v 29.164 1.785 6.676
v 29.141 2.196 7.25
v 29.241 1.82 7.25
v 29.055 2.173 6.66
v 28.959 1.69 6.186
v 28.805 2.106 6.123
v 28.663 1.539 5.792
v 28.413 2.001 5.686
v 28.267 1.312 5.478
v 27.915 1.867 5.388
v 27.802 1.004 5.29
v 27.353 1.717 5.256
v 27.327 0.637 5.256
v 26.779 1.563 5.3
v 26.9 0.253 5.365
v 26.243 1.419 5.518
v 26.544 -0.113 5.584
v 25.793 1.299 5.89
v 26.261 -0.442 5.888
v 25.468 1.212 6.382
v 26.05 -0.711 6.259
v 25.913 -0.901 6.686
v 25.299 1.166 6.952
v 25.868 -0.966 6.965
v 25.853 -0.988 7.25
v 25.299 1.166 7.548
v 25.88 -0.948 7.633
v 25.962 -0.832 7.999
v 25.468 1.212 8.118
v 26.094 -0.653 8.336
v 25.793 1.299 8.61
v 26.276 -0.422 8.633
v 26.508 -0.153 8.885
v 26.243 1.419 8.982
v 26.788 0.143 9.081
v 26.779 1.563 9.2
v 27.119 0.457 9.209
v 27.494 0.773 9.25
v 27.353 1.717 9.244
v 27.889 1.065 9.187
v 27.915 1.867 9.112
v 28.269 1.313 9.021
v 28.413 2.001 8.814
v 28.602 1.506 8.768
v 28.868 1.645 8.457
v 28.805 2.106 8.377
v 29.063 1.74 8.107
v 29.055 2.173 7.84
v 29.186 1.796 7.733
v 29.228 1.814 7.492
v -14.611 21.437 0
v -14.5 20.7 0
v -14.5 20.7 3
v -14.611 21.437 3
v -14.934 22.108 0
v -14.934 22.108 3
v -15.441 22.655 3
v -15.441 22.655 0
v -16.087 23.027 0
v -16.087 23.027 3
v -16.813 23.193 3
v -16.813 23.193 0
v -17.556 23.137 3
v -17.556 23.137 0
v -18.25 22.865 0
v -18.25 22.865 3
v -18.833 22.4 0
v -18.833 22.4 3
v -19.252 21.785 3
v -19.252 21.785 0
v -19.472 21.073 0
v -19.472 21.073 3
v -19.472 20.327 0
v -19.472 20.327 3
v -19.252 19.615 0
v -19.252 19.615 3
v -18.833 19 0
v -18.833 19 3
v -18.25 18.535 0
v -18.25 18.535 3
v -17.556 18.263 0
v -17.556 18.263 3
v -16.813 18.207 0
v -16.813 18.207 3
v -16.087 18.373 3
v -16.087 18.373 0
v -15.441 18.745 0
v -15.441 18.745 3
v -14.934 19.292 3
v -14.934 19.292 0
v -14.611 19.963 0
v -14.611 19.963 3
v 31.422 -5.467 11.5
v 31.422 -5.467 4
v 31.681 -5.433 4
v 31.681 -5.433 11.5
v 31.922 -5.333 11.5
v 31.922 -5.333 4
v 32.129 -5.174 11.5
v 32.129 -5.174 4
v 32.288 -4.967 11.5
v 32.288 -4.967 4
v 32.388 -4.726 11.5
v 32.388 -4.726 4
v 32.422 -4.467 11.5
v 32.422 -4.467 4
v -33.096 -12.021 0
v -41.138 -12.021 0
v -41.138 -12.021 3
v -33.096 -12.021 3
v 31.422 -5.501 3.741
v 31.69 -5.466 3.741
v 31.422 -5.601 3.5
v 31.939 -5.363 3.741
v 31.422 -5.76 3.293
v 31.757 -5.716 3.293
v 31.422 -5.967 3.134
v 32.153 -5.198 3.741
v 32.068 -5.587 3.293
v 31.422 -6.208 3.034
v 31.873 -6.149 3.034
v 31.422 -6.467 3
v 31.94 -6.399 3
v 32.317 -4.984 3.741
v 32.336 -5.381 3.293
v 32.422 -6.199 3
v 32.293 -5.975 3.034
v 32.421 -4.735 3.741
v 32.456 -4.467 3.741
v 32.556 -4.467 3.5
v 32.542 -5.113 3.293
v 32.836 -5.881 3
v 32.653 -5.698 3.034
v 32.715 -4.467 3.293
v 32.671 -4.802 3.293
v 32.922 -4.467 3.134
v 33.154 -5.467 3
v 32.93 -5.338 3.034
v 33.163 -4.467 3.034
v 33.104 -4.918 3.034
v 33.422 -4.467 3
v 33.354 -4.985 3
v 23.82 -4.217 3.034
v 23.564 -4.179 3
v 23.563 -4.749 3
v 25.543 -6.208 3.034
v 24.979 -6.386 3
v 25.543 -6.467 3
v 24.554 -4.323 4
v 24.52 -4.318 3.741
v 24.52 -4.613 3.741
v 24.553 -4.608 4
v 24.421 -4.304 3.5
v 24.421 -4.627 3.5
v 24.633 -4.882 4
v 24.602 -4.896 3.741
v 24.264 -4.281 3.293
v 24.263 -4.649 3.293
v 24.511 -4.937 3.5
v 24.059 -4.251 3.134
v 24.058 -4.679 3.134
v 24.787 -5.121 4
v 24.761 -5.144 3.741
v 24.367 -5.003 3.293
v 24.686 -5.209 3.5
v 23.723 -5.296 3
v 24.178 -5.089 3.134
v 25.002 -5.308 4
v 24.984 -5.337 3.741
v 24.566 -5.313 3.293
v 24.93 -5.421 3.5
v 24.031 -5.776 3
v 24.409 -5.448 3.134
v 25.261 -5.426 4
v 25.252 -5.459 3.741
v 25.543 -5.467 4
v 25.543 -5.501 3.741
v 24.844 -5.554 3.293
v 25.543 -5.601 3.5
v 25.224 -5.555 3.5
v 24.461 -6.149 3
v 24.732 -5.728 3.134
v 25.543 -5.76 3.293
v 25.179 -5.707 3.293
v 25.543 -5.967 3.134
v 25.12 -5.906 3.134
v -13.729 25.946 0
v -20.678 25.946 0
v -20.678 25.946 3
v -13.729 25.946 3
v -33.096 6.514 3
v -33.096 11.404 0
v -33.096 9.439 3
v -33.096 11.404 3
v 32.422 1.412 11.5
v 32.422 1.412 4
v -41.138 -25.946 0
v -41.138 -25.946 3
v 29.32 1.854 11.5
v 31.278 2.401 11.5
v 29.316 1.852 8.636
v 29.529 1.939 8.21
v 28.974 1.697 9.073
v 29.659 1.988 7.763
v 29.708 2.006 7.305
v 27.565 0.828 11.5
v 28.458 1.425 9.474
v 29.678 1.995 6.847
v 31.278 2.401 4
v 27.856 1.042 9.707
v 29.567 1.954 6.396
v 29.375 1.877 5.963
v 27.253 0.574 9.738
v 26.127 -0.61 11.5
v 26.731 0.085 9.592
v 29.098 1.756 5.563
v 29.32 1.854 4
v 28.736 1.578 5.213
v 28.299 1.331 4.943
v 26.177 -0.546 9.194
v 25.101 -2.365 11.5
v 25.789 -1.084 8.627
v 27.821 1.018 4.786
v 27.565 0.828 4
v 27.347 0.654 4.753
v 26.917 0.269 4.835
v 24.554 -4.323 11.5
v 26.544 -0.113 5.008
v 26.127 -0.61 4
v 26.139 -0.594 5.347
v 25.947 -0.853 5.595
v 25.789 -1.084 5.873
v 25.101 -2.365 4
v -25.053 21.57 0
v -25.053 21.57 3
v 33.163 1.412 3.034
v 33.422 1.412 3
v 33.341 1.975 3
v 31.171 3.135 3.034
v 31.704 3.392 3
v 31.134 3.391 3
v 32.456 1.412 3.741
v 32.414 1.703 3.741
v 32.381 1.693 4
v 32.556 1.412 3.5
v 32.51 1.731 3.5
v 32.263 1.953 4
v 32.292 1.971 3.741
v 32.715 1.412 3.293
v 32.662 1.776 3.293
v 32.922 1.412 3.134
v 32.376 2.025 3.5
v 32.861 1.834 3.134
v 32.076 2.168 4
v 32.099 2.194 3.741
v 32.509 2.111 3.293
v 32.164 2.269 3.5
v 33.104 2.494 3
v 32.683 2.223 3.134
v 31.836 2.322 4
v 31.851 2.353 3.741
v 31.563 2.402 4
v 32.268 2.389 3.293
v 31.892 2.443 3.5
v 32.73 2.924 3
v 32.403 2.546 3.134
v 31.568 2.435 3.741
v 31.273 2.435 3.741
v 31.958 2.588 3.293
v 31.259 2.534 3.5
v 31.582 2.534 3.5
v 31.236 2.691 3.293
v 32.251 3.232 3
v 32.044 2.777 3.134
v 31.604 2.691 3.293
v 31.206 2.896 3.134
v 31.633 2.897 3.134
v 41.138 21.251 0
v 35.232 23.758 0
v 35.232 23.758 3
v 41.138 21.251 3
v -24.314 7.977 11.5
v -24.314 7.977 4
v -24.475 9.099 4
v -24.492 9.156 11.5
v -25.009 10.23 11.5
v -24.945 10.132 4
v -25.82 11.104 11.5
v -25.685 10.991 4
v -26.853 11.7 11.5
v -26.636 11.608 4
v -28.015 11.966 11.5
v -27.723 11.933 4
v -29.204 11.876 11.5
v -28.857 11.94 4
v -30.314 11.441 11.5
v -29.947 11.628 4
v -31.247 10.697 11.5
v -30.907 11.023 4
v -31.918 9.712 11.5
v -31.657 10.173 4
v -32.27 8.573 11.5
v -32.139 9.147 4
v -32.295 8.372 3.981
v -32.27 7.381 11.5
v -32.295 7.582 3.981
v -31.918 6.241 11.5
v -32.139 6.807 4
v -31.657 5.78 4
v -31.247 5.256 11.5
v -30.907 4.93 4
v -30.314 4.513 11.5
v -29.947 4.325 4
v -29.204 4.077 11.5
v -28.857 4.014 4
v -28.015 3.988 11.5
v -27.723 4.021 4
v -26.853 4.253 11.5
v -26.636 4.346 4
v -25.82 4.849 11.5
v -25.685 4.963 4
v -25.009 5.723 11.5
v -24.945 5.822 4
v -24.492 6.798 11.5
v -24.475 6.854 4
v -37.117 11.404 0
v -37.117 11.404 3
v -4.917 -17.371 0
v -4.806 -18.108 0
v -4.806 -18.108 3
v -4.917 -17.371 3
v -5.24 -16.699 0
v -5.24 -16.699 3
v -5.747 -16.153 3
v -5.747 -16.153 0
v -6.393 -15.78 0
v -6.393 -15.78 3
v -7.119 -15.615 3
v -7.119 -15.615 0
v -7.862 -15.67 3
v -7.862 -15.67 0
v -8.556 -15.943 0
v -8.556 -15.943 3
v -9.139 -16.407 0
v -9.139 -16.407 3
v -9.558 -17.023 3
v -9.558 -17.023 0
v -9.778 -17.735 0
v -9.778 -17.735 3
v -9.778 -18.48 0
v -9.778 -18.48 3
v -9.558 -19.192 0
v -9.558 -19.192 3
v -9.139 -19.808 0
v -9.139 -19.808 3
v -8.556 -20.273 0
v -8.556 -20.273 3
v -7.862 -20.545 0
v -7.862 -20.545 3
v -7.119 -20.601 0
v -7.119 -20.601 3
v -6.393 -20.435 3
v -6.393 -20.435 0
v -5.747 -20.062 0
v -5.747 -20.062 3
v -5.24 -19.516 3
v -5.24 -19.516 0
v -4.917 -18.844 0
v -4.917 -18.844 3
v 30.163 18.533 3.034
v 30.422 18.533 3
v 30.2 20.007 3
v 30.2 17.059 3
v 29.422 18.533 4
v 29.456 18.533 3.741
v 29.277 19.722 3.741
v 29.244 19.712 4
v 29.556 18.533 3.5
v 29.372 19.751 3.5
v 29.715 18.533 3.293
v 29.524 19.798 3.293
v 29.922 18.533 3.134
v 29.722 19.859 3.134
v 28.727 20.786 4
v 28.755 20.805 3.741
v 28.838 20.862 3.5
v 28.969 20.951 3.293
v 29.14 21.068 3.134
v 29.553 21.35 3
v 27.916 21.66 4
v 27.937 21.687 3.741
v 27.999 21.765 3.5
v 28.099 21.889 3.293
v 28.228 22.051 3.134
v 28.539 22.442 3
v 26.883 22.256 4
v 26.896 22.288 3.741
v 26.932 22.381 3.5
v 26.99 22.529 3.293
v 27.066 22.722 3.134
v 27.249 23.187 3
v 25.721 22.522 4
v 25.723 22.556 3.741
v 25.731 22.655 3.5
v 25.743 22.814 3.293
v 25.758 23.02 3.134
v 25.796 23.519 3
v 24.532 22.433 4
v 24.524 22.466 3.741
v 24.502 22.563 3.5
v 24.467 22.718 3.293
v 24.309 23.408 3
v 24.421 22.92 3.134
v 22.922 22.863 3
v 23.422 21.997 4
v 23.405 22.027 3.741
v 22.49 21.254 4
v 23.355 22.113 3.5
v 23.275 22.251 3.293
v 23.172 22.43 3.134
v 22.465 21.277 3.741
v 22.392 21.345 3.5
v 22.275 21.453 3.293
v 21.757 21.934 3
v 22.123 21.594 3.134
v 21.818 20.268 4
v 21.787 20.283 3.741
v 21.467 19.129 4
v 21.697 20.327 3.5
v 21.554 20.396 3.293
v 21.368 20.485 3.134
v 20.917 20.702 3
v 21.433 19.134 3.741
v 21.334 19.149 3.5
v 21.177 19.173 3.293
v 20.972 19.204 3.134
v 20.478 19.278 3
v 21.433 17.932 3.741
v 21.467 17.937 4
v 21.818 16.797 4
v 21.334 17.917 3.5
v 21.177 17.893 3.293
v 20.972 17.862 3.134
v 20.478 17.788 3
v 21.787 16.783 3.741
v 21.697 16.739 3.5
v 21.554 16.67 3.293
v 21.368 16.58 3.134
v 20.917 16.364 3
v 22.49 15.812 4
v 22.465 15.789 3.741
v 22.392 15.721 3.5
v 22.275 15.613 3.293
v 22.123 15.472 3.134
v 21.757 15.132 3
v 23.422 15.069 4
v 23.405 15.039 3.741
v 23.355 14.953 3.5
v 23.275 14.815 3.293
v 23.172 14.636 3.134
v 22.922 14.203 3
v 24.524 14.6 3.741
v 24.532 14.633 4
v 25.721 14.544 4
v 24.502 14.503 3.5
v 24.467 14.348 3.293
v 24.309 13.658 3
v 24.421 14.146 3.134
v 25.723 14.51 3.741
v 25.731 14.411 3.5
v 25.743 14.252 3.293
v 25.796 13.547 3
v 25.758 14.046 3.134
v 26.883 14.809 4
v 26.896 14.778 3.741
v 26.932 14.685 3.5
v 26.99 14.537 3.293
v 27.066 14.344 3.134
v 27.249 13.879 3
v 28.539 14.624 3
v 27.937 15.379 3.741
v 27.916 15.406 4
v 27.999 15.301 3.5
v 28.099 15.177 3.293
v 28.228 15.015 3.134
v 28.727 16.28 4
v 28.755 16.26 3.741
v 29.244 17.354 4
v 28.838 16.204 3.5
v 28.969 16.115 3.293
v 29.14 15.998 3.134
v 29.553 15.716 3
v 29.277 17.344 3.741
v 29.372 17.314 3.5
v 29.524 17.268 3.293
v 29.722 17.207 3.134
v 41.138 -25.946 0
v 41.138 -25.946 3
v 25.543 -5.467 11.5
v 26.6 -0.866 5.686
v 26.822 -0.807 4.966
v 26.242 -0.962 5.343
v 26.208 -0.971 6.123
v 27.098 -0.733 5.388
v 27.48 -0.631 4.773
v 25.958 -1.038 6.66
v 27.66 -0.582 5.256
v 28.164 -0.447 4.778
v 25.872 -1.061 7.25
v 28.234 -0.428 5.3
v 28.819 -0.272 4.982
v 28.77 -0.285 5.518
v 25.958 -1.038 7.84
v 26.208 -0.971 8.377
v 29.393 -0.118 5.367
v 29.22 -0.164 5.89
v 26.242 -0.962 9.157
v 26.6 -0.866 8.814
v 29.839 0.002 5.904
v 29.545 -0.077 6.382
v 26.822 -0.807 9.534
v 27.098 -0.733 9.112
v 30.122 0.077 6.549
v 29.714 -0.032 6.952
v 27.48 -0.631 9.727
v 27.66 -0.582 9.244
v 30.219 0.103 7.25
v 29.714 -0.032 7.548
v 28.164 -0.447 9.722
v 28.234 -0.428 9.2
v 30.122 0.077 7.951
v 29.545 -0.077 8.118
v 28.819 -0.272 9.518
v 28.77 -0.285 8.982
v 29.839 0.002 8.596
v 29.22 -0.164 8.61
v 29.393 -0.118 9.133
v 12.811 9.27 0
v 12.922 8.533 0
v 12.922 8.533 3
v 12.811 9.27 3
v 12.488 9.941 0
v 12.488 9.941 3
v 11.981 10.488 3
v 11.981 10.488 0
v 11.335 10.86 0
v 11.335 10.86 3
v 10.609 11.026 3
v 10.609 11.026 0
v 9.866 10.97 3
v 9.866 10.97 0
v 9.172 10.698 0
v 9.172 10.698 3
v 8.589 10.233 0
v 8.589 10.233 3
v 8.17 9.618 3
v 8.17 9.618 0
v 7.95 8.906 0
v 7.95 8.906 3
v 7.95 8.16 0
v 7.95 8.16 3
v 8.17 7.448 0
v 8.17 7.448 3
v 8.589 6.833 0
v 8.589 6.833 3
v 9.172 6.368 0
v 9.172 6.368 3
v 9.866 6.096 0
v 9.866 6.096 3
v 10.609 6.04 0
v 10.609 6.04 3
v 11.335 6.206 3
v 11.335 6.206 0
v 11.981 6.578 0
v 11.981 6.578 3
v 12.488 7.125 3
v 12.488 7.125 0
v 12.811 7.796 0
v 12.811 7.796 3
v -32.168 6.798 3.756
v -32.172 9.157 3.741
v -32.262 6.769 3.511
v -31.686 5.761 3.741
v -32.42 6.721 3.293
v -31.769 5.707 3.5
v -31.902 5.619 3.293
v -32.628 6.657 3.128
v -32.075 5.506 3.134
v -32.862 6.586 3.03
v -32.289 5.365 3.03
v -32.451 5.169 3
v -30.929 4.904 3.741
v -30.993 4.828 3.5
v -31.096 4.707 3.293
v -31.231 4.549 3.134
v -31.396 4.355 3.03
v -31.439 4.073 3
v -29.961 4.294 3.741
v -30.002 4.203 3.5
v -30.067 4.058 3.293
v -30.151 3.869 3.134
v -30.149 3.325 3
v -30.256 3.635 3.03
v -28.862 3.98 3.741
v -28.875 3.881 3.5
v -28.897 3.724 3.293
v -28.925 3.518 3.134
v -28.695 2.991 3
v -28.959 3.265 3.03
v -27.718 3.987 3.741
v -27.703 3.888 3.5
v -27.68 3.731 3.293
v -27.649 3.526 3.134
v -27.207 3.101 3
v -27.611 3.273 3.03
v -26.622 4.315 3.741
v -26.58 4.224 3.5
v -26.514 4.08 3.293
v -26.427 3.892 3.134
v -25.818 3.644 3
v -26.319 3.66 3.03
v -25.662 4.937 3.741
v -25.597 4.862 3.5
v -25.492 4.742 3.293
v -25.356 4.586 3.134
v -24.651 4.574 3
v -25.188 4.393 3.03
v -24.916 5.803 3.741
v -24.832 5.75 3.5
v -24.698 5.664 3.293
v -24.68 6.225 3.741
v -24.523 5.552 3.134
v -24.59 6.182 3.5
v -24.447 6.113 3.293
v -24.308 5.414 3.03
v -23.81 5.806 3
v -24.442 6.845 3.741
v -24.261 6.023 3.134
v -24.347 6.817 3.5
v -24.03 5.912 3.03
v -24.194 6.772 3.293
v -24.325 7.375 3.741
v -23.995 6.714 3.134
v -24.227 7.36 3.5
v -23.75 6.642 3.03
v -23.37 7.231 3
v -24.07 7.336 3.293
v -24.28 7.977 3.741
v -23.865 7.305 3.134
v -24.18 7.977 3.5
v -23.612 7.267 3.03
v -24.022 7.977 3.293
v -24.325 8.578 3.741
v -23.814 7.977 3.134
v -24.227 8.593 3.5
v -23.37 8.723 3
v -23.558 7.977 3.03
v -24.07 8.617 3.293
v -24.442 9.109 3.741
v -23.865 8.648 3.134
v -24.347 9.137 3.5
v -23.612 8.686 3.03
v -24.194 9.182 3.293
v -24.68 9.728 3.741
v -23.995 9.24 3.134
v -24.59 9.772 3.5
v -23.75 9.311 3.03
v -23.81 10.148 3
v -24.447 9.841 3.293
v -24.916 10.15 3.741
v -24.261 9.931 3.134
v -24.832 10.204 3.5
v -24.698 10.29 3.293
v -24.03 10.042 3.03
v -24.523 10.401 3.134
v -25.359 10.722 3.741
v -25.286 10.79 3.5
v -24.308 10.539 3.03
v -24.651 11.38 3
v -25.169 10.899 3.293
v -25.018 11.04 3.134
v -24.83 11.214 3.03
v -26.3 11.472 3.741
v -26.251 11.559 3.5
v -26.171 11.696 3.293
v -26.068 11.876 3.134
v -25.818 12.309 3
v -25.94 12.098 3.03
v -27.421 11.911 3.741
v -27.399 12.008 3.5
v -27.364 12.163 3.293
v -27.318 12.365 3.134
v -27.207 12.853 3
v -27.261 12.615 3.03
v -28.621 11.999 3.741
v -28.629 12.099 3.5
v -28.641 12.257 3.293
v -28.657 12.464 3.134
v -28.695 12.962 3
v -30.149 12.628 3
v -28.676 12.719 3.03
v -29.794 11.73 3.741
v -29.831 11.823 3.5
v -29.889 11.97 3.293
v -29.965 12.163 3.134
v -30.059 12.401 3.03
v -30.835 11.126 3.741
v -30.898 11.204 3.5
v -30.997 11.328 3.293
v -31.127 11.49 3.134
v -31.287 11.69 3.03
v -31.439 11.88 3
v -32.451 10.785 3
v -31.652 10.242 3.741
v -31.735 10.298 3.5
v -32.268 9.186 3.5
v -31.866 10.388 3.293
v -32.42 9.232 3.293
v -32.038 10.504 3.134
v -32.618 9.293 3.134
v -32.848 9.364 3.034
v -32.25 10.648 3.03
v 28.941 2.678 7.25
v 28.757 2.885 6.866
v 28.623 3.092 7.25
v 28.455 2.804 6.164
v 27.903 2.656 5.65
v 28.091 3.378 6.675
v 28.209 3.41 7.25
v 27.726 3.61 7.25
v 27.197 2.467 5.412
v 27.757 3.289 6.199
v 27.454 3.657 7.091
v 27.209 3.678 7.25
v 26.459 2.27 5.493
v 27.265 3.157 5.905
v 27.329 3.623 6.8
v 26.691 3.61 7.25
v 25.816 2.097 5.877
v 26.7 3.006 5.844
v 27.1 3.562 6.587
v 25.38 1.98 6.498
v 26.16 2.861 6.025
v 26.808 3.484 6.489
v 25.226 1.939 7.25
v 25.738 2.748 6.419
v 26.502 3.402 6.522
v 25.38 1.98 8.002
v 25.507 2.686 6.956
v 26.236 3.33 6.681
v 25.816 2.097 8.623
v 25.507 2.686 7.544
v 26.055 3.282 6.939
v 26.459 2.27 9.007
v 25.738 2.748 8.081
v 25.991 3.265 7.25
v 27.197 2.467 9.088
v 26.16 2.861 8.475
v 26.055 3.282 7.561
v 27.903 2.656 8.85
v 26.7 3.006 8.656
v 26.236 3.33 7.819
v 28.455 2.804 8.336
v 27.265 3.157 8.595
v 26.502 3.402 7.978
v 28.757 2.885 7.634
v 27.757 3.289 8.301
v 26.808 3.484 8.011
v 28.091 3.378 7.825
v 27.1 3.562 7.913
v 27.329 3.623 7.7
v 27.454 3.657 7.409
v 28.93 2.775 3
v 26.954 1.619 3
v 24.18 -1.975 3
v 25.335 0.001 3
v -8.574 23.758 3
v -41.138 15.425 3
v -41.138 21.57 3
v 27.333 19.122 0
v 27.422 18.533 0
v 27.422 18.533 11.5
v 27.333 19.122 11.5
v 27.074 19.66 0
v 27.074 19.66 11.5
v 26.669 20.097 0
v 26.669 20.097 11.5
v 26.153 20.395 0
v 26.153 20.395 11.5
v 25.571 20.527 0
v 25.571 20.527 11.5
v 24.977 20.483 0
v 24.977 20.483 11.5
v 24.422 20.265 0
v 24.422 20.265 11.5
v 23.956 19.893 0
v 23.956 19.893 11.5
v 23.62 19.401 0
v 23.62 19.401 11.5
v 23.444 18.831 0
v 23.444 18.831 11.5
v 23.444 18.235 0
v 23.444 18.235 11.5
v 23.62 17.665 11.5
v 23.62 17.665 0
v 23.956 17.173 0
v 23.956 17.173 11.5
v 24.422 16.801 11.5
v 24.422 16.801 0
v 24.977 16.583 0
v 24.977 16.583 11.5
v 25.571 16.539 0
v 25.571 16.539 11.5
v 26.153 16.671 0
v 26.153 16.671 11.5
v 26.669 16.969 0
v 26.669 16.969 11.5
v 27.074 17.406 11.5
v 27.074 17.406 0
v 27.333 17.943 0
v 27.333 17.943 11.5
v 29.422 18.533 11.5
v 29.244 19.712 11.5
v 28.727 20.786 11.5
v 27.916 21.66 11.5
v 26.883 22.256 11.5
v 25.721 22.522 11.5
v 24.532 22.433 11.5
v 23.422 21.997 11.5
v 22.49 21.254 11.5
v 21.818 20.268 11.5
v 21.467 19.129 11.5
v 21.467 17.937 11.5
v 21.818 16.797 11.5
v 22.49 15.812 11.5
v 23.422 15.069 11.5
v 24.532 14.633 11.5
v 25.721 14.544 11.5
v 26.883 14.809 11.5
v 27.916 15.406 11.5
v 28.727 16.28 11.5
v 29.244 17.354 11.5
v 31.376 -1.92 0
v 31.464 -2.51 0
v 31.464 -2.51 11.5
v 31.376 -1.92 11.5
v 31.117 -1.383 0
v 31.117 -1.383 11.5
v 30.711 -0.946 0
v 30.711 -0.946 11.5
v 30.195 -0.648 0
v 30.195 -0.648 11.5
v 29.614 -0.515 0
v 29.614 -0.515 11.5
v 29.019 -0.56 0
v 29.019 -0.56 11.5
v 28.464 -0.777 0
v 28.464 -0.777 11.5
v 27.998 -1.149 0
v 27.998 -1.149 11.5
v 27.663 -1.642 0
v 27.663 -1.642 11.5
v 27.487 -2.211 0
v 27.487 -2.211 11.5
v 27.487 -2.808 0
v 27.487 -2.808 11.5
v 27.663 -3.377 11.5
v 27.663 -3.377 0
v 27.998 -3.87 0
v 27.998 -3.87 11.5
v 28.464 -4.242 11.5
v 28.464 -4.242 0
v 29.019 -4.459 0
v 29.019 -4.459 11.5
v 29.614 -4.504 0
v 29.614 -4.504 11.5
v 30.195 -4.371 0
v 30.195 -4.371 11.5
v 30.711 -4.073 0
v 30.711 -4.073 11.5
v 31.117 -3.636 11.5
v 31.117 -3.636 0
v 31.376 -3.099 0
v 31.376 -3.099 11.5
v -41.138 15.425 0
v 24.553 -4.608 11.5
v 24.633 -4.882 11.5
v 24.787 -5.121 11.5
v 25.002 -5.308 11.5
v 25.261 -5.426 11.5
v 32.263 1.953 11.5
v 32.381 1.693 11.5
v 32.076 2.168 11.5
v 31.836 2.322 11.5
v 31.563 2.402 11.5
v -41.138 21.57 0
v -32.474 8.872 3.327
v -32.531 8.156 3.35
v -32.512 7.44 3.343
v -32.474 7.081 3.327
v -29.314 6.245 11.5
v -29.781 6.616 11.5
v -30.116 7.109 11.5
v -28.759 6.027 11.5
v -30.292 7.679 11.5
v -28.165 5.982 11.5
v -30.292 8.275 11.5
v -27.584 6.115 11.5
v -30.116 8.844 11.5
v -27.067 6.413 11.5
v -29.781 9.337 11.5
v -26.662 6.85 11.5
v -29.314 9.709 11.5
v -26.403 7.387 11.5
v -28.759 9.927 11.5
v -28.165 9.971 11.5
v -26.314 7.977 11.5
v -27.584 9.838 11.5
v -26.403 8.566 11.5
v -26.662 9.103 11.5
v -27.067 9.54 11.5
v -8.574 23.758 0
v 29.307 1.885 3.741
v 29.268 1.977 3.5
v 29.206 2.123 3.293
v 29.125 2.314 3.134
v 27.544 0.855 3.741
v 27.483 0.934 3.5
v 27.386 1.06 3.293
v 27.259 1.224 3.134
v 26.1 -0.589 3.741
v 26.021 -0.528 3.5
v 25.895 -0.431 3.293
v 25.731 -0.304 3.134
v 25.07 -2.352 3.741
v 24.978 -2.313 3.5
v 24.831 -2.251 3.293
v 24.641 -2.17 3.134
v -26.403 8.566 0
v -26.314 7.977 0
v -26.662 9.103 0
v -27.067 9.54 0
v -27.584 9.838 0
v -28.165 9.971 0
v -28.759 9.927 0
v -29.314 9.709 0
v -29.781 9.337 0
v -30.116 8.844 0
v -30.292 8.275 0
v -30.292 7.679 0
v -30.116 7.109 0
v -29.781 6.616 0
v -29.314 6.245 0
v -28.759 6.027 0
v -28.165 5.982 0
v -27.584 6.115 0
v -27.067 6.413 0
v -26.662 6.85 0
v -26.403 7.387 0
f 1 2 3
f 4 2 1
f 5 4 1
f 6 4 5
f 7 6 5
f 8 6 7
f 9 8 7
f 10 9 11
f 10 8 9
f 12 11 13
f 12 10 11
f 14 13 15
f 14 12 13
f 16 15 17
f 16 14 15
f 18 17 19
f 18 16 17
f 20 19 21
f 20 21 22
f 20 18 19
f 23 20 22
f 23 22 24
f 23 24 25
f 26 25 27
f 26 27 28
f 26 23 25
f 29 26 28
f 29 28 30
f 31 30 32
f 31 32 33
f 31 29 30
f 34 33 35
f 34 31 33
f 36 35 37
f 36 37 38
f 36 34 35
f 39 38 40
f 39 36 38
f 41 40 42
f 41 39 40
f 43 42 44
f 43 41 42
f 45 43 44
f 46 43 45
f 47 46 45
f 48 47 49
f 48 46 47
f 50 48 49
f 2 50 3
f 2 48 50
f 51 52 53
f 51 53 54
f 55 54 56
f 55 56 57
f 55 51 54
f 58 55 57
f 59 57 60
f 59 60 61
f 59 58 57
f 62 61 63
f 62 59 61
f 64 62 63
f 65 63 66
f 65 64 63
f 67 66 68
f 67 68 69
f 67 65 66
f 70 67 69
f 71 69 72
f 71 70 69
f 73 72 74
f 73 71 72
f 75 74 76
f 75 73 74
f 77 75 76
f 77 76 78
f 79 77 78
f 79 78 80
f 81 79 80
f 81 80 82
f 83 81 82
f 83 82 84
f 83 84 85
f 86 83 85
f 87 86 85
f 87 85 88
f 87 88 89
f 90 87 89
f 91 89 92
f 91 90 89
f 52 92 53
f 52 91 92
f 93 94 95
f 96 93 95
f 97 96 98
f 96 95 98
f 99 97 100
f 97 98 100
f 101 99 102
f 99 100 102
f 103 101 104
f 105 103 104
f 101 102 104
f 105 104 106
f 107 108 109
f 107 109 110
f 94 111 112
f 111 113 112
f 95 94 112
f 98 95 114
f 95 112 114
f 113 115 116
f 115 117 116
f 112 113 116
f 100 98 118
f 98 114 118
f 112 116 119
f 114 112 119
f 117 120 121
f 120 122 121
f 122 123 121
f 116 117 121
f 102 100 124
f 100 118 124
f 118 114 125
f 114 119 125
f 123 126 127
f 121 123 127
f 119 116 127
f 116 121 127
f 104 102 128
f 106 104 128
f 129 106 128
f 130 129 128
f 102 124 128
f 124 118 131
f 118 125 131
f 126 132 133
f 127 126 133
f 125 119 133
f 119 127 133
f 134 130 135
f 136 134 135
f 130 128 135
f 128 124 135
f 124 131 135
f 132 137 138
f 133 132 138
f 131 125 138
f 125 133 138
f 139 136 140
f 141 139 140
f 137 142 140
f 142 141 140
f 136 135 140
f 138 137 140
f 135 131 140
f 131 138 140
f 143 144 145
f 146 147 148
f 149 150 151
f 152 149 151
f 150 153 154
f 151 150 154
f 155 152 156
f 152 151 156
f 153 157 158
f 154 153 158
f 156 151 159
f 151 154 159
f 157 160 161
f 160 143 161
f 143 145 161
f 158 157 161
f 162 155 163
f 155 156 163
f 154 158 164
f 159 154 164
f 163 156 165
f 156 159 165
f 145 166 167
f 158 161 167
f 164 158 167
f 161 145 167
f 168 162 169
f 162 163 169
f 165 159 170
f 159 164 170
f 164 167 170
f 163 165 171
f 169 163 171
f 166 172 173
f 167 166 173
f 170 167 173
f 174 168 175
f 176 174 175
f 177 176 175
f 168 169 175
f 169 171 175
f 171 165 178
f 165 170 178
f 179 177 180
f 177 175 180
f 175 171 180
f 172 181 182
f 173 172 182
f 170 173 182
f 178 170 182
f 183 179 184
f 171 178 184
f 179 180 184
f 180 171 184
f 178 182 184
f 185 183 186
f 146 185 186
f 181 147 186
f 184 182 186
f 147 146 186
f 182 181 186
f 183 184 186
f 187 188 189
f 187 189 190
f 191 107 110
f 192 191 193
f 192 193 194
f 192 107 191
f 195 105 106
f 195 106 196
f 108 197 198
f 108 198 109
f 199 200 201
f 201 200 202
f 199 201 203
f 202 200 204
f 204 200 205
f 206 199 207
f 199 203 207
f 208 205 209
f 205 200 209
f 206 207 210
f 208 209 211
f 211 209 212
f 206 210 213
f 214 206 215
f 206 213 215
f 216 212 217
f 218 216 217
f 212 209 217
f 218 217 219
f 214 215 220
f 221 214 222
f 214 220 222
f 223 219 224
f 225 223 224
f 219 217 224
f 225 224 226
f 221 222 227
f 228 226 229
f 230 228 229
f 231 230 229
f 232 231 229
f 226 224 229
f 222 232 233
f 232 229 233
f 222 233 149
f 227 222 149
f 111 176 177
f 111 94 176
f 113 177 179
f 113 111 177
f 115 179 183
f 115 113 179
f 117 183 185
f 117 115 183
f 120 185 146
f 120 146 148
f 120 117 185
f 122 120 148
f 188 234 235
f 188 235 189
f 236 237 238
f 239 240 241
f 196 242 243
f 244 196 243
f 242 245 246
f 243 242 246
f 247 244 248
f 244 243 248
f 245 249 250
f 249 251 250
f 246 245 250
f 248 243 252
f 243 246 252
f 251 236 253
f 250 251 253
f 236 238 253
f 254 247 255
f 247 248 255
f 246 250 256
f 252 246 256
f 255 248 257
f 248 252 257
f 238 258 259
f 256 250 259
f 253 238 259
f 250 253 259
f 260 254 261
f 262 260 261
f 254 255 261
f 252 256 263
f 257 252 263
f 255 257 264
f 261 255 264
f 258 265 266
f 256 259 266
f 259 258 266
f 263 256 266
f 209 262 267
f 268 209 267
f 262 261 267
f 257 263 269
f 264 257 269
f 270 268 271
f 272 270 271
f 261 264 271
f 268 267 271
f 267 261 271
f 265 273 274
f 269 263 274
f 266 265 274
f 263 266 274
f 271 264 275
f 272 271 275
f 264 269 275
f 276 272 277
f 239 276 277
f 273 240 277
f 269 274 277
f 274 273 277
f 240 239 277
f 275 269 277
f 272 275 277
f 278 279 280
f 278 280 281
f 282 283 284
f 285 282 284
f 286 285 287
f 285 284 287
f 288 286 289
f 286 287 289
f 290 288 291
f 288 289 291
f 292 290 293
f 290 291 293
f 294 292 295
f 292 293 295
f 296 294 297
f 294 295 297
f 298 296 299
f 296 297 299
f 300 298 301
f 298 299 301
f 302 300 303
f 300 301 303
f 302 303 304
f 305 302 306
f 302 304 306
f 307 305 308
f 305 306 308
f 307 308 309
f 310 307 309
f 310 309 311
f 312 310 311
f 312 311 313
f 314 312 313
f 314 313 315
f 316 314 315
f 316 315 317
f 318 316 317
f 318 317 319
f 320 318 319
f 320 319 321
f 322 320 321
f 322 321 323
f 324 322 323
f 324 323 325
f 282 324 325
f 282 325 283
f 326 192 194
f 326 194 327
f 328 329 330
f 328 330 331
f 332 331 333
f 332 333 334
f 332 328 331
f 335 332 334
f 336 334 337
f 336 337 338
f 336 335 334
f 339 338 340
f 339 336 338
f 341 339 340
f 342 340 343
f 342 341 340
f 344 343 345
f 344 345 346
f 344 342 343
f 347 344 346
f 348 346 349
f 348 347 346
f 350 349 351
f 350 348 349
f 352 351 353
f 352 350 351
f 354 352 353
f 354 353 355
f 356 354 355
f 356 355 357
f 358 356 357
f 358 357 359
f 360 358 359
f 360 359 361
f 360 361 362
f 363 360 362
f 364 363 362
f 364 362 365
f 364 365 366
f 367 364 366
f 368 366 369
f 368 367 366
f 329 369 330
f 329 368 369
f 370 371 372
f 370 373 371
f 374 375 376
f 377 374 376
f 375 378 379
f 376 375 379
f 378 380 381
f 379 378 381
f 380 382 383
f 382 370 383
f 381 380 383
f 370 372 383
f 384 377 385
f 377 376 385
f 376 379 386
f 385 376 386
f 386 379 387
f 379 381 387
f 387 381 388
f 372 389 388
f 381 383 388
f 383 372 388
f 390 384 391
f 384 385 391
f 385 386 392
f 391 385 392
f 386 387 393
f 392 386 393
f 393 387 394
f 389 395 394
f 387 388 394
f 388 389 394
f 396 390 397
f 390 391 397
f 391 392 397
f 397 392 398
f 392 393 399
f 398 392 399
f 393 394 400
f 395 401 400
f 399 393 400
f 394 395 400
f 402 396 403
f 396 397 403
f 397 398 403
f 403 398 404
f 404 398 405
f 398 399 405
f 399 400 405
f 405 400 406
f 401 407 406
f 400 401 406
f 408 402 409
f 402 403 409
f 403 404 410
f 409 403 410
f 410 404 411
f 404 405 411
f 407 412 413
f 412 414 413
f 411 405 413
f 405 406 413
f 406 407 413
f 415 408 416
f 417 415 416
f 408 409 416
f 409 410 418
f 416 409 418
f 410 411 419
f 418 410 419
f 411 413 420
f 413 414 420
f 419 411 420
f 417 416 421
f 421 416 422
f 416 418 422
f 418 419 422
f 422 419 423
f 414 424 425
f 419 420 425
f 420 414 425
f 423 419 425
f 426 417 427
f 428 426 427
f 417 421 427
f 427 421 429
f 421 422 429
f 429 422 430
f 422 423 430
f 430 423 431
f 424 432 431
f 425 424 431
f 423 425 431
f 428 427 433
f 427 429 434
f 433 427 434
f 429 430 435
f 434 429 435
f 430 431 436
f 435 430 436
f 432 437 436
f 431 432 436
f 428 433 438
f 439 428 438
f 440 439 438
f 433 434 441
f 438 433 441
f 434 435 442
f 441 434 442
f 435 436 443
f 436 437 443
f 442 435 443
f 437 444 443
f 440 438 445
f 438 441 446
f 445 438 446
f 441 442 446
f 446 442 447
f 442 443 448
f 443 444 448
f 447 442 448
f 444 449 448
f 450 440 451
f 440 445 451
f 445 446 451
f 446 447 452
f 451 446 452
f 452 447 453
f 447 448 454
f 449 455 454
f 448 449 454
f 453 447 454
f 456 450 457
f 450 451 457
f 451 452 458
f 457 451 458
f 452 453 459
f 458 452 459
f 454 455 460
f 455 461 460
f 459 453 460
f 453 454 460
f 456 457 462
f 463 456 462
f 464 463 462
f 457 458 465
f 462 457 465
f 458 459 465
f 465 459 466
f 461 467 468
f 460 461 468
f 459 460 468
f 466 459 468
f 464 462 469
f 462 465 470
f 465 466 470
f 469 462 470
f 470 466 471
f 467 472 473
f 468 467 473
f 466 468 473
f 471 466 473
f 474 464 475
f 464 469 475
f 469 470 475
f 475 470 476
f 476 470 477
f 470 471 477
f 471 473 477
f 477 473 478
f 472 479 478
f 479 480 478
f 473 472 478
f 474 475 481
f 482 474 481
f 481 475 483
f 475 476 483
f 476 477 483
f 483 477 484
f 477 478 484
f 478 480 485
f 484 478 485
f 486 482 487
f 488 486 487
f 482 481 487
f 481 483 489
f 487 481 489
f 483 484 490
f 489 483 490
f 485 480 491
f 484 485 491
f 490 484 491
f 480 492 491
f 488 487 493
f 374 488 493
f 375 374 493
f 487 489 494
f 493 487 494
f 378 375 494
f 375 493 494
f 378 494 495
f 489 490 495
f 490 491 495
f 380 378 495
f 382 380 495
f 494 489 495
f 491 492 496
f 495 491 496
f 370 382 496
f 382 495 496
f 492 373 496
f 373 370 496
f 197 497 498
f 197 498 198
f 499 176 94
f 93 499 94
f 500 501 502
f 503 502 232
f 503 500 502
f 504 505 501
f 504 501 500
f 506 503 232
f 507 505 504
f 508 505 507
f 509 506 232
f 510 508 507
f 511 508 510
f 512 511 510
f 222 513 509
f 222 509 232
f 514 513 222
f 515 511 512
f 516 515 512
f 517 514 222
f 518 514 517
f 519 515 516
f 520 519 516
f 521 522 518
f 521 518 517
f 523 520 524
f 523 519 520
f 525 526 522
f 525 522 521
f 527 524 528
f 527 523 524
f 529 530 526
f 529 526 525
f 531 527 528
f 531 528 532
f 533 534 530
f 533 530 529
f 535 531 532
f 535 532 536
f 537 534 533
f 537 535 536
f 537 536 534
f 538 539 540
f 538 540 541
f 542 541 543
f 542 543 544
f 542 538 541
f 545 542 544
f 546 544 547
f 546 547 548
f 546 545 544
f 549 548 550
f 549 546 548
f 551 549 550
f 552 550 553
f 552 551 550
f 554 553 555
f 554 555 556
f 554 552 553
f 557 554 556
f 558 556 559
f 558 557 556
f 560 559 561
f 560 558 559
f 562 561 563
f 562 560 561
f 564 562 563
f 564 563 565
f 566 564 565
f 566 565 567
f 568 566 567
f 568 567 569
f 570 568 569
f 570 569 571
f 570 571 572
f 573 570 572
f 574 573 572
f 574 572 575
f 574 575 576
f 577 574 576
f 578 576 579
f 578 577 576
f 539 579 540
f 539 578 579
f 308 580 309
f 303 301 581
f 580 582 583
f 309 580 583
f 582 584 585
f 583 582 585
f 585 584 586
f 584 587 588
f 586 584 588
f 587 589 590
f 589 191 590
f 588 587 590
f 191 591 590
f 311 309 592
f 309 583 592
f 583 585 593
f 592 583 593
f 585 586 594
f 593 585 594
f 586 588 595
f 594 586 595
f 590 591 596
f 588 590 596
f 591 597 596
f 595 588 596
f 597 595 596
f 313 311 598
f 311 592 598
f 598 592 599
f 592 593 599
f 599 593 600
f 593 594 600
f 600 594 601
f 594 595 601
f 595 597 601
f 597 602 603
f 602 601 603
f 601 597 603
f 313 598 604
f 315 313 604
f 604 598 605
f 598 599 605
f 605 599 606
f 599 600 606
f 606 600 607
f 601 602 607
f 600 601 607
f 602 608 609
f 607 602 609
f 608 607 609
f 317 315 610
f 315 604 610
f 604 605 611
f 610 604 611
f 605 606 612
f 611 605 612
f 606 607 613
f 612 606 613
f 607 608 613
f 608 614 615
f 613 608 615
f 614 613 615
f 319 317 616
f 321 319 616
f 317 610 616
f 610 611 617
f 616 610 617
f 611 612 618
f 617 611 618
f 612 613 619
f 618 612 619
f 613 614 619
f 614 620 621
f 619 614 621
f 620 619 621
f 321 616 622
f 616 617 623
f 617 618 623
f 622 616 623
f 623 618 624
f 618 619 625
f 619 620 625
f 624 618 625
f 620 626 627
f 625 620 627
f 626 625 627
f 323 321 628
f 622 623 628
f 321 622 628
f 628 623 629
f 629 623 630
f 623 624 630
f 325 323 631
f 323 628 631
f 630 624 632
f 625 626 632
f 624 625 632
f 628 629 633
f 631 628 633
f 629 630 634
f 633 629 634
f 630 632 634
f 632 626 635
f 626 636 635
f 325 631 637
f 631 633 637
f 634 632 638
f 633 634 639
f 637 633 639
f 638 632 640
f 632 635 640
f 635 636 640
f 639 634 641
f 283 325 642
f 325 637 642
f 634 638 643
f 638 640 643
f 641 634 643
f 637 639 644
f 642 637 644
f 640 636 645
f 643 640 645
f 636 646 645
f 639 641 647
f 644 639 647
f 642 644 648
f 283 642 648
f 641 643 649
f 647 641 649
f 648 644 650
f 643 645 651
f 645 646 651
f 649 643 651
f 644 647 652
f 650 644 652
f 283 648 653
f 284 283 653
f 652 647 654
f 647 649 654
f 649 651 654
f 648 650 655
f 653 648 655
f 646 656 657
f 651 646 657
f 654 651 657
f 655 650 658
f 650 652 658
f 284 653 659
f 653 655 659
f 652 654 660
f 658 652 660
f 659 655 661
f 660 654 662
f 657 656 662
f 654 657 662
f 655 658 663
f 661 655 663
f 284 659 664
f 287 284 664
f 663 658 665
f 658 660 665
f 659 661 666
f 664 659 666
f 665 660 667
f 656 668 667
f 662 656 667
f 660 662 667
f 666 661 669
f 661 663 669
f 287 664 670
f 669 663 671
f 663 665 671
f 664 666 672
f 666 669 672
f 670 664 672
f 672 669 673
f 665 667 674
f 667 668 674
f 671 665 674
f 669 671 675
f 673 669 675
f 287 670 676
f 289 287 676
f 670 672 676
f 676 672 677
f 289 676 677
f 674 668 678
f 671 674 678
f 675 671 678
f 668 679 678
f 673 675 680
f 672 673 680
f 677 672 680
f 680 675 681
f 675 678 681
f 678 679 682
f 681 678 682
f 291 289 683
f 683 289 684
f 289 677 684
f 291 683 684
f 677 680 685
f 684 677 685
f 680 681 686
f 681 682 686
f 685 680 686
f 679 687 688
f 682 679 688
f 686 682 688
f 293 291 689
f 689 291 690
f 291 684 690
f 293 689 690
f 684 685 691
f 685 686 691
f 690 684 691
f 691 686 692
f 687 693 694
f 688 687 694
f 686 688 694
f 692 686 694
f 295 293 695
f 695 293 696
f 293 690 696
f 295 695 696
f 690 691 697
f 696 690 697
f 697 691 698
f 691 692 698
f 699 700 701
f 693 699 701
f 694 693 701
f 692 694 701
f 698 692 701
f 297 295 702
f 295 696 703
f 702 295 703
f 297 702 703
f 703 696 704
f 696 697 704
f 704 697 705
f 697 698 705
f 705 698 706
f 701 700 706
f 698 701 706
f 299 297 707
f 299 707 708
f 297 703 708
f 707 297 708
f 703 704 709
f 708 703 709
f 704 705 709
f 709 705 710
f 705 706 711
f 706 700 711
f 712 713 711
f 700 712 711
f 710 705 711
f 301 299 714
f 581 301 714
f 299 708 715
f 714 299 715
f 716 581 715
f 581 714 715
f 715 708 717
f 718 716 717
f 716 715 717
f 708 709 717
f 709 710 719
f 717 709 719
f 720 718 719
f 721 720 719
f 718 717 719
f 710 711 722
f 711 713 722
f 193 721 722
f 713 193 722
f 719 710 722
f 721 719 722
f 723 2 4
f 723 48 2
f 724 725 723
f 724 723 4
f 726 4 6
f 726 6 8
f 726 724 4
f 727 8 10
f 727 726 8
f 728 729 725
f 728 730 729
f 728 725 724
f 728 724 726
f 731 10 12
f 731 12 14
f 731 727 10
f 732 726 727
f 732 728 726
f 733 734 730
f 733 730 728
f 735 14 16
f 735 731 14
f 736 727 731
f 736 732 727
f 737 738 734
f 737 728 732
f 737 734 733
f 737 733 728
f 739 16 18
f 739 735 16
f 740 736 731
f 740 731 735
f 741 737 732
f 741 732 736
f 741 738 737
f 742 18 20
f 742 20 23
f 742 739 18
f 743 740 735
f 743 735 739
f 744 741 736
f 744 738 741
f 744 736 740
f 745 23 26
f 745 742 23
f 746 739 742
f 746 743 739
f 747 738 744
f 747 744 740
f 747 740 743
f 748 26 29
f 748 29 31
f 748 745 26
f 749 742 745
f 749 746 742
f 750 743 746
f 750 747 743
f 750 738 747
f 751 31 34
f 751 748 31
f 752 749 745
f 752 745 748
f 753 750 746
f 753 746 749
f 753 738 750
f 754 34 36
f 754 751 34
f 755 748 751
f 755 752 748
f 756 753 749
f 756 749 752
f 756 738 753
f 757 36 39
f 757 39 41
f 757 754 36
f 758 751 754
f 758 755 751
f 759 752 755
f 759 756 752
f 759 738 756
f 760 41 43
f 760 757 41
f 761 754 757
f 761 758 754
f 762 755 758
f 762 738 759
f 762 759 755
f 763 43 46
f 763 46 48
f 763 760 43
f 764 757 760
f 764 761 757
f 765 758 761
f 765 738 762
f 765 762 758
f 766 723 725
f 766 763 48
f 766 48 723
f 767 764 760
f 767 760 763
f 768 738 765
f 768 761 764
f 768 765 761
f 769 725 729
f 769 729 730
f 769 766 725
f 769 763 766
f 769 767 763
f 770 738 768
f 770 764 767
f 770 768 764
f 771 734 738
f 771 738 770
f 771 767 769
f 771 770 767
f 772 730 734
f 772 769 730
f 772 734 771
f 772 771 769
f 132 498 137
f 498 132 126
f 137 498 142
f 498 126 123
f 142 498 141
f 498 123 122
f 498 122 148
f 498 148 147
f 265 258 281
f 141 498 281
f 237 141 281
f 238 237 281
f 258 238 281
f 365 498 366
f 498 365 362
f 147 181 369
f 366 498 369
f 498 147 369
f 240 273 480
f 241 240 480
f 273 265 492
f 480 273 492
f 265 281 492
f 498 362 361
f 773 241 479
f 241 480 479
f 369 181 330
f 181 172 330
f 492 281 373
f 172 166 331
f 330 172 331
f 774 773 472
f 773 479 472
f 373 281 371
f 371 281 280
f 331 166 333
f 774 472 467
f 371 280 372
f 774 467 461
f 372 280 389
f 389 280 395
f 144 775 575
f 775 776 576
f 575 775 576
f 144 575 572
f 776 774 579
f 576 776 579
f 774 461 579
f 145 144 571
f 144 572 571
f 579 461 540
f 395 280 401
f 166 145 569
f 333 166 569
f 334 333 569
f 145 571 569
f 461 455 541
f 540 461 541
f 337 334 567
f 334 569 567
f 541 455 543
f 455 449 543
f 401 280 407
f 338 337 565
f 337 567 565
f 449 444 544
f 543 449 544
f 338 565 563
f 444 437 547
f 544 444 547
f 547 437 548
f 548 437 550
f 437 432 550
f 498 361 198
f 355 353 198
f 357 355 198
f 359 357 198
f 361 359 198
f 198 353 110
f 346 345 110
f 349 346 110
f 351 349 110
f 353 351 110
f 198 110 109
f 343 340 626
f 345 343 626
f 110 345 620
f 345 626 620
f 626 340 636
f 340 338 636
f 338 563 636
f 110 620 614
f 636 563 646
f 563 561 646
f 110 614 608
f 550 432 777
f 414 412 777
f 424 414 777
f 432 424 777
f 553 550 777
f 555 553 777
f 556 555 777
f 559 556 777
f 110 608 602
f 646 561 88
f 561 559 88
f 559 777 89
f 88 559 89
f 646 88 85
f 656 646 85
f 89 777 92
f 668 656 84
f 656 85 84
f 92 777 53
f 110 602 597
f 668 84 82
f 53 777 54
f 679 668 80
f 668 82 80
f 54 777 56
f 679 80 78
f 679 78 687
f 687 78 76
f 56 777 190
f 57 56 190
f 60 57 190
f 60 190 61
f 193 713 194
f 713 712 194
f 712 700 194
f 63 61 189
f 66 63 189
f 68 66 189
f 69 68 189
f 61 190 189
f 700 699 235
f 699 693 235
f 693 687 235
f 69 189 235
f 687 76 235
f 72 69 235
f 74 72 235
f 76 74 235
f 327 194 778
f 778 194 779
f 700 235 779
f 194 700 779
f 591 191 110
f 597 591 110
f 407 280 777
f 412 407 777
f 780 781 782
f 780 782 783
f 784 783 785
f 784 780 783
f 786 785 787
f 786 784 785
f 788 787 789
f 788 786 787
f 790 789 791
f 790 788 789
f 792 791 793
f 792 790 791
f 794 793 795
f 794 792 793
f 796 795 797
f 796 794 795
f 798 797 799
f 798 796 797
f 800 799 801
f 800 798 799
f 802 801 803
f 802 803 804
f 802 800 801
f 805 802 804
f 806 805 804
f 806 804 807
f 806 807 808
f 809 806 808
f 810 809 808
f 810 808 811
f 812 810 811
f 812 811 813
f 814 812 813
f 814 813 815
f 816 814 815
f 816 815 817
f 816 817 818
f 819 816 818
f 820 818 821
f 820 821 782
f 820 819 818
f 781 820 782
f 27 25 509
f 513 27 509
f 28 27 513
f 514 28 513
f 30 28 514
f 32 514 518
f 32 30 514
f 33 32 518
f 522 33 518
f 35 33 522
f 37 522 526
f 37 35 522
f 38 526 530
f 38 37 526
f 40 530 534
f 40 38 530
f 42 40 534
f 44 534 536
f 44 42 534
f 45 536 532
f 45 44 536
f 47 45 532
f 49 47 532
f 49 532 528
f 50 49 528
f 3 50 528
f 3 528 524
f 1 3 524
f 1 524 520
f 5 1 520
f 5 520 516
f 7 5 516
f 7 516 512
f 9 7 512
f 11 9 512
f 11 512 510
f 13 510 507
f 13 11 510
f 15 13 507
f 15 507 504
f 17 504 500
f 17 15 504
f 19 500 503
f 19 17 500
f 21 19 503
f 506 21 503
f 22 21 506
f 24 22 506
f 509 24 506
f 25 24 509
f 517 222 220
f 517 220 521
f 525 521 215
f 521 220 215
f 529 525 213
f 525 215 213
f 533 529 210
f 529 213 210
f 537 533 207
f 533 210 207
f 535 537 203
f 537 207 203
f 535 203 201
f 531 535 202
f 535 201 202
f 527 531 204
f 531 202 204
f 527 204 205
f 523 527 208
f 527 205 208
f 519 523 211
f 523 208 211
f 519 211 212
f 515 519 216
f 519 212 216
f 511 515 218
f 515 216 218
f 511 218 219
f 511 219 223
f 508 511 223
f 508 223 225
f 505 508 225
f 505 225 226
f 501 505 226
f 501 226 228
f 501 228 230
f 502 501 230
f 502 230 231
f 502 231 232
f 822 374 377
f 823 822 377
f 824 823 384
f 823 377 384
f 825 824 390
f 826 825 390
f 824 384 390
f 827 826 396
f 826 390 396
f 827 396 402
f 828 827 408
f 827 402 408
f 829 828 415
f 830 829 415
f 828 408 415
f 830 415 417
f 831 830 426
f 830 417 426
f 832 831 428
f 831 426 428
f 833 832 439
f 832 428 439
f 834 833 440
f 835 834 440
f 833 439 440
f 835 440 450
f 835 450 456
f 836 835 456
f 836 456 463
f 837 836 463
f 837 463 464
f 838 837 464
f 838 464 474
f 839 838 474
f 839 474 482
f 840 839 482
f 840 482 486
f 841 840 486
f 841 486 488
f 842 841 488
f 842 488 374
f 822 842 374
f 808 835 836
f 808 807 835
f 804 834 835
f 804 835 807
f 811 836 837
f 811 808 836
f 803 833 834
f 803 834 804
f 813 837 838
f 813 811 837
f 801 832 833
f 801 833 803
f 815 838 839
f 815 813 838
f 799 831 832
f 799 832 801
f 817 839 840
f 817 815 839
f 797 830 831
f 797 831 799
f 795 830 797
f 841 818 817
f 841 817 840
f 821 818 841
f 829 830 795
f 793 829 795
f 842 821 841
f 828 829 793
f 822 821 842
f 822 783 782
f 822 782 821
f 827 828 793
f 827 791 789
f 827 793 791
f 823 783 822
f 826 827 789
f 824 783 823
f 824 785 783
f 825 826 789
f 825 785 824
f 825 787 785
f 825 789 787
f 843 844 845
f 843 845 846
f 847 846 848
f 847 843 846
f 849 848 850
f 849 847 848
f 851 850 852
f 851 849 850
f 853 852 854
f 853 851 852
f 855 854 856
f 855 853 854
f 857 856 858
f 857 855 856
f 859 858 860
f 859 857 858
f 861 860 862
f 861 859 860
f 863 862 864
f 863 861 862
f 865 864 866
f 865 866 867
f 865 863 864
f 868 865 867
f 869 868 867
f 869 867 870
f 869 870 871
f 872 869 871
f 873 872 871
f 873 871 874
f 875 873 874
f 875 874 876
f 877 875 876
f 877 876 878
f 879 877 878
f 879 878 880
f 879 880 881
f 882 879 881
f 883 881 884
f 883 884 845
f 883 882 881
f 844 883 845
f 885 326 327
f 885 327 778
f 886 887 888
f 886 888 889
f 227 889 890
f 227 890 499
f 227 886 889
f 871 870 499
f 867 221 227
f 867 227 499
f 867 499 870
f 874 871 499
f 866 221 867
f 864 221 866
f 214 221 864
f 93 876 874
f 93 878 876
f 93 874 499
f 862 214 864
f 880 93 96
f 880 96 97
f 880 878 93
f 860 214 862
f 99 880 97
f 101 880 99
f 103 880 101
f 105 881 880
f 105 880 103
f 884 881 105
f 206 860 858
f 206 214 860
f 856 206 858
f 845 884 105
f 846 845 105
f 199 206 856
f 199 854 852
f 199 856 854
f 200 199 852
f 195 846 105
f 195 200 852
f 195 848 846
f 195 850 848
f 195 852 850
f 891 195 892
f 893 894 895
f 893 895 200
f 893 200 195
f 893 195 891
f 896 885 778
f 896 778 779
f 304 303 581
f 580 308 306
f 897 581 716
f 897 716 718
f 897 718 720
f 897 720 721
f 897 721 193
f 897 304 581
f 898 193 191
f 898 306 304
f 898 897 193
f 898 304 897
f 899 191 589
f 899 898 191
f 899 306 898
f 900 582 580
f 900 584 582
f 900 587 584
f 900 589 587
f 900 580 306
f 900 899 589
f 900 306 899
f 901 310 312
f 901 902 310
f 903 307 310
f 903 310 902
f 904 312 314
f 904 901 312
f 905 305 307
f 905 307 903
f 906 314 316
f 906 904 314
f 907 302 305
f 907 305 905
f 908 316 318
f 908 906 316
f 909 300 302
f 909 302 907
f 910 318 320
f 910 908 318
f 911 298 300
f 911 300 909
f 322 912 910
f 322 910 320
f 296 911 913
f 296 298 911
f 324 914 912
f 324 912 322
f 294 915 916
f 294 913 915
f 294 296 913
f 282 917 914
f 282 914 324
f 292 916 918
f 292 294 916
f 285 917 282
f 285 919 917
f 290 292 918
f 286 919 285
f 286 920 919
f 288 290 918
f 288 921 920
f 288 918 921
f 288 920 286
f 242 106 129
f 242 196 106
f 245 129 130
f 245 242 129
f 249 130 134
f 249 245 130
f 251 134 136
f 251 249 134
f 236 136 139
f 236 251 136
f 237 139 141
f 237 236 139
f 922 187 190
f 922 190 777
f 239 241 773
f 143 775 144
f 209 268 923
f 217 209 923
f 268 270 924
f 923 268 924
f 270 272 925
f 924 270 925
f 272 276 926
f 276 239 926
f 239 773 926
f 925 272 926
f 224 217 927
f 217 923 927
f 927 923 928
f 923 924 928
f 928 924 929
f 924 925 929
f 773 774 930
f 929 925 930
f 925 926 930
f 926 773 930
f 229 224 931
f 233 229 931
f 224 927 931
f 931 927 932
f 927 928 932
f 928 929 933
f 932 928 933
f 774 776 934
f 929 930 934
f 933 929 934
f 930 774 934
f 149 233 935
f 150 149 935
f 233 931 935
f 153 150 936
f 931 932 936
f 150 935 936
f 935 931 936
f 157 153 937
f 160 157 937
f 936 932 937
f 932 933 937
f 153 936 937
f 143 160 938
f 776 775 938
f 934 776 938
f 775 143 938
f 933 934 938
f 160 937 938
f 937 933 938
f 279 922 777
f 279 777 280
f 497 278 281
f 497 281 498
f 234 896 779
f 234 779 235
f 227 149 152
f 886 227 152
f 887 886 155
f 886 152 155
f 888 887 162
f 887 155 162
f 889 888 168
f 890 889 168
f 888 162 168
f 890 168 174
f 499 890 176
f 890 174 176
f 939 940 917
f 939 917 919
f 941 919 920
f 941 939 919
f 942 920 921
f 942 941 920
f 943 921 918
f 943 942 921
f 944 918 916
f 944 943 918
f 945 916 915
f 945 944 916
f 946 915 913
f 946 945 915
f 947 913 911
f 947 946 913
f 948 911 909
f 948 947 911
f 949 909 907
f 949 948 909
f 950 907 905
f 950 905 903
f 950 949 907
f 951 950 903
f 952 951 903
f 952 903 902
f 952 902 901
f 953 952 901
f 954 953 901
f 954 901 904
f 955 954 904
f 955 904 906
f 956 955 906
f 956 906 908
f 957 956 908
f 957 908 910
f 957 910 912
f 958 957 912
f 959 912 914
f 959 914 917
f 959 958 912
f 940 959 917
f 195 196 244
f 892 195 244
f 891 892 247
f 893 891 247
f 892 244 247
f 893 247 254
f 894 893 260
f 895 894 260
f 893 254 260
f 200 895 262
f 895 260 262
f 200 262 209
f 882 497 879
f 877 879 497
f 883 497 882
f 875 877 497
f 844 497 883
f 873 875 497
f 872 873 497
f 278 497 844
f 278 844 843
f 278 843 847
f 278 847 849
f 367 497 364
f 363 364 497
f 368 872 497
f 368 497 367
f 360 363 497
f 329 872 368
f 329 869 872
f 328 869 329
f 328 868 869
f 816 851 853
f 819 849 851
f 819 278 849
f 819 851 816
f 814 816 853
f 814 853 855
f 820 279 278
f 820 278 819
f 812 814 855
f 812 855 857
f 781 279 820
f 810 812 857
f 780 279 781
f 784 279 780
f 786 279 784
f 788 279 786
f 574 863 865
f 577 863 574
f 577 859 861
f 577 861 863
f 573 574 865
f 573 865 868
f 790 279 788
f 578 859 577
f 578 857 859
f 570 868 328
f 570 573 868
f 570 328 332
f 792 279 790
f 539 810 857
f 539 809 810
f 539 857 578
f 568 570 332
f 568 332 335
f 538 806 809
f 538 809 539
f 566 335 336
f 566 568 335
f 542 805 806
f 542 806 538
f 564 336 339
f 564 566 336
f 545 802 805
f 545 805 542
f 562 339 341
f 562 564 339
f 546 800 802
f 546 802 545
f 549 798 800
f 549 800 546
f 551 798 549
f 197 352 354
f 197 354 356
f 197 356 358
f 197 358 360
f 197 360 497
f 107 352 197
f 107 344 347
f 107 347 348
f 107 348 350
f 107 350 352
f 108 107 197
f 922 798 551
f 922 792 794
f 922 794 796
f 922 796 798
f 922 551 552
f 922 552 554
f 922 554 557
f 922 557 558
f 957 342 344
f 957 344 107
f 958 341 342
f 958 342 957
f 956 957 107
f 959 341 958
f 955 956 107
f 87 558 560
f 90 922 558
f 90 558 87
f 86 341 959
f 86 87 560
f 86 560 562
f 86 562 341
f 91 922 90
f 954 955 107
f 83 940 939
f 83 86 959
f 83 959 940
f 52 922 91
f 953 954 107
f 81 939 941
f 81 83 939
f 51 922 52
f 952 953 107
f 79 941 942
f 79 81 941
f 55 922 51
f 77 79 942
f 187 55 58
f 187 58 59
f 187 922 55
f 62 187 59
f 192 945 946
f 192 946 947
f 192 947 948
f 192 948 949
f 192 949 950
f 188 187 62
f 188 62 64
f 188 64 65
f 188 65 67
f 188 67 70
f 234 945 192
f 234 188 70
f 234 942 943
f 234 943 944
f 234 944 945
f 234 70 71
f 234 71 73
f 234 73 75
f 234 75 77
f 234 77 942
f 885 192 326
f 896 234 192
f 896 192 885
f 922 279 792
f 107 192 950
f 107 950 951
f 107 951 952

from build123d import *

# Parameters (mm, degrees)
SKETCH_2_R          = 2.5
SKETCH_2_R_2        = 4
EXTRUDE_1_DEPTH     = 3
SKETCH_2_3_R        = 2
SKETCH_2_3_R_2      = 4
EXTRUDE_2_DEPTH     = 11.5
SKETCH_6_R          = 2
EXTRUDE_3_DEPTH     = 2.3
FILLET_1_R          = 2
SKETCH_7_R          = 2.5
SKETCH_7_R_2        = 2
CUT_EXTRUDE_2_DEPTH = 2
FILLET_2_R          = 1


with BuildPart() as part:
    # 스케치2 → 보스-돌출1 (new body)
    with BuildSketch(Plane.XY):
        Polygon((-25.053133429, 21.570131373), (-41.138288377, 21.570131373), (-41.138288377, 15.425110404), (-37.11699964, 11.403821667), (-33.095710903, 11.403821667), (-33.095710903, -12.020899542), (-41.138288377, -12.020899542), (-41.138288377, -25.94560961), (41.138288377, -25.94560961), (41.138288377, 21.251065018), (35.231937864, 23.757870491), (-8.574109119, 23.757870491), (-13.728698976, 25.94560961), (-20.677655191, 25.94560961), align=None)
        with Locations((-7.306059133, -18.107570273)):
            Circle(SKETCH_2_R, mode=Mode.SUBTRACT)
        with BuildLine():
            Line((31.421946091, -5.467040421), (25.543402205, -5.467040421))
            ThreePointArc((25.543402205, -5.467040421), (24.78713928, -5.121308248), (24.553805205, -4.323173199))
            ThreePointArc((24.553805205, -4.323173199), (26.799843583, 0.155062087), (31.278078869, 2.401100465))
            ThreePointArc((31.278078869, 2.401100465), (32.076213917, 2.167766389), (32.421946091, 1.411503465))
            Line((32.421946091, 1.411503465), (32.421946091, -4.467040421))
            ThreePointArc((32.421946091, -4.467040421), (32.129052872, -5.174147202), (31.421946091, -5.467040421))
        make_face(mode=Mode.SUBTRACT)
        with Locations((-28.314407571, 7.976729123)):
            Circle(SKETCH_2_R_2, mode=Mode.SUBTRACT)
        with Locations((-17, 20.7)):
            Circle(SKETCH_2_R, mode=Mode.SUBTRACT)
        with Locations((10.421946091, 8.532959579)):
            Circle(SKETCH_2_R, mode=Mode.SUBTRACT)
        with Locations((25.421946091, 18.532959579)):
            Circle(SKETCH_2_R_2, mode=Mode.SUBTRACT)
    extrude(amount=EXTRUDE_1_DEPTH)

    # 스케치2<3> → 보스-돌출2 (add)
    # profile 1 of 3: a face of its own
    with BuildSketch(Plane.XY):
        with BuildLine():
            ThreePointArc((24.553805205, -4.323173199), (24.78713928, -5.121308248), (25.543402205, -5.467040421))
            Line((25.543402205, -5.467040421), (31.421946091, -5.467040421))
            ThreePointArc((31.421946091, -5.467040421), (32.129052872, -5.174147202), (32.421946091, -4.467040421))
            Line((32.421946091, -4.467040421), (32.421946091, 1.411503465))
            ThreePointArc((32.421946091, 1.411503465), (32.076213917, 2.167766389), (31.278078869, 2.401100465))
            ThreePointArc((31.278078869, 2.401100465), (26.799843583, 0.155062087), (24.553805205, -4.323173199))
        make_face()
        with Locations((29.464448227, -2.509542558)):
            Circle(SKETCH_2_3_R, mode=Mode.SUBTRACT)
    # profile 2 of 3: a face of its own
    with BuildSketch(Plane.XY):
        with Locations((-28.314407571, 7.976729123)):
            Circle(SKETCH_2_3_R_2)
        with Locations((-28.314407571, 7.976729123)):
            Circle(SKETCH_2_3_R, mode=Mode.SUBTRACT)
    # profile 3 of 3: a face of its own
    with BuildSketch(Plane.XY):
        with Locations((25.421946091, 18.532959579)):
            Circle(SKETCH_2_3_R_2)
        with Locations((25.421946091, 18.532959579)):
            Circle(SKETCH_2_3_R, mode=Mode.SUBTRACT)
    extrude(amount=EXTRUDE_2_DEPTH)

    # 스케치6 → 보스-돌출3 (add, symmetric)
    with BuildSketch(Plane(origin=(1.480786333, -5.526369829, 0), x_dir=(0, 0, 1), z_dir=(-0.25881904510252574, 0.9659258262890671, 0))):
        with Locations((7.25, 26.715994864)):
            Circle(SKETCH_6_R)
    extrude(amount=EXTRUDE_3_DEPTH, both=True)

    # 필렛1
    fillet_1_edges = [part.edges().sort_by_distance(p)[0] for p in [
        (26.691171943, 3.609867851, 5.25),
    ]]
    fillet(fillet_1_edges, radius=FILLET_1_R)

    # 스케치7 → 컷-돌출2 (cut)
    with BuildSketch(Plane(origin=(1.480786333, -5.526369829, 0), x_dir=(0, 0, 1), z_dir=(-0.25881904510252574, 0.9659258262890671, 0))):
        with Locations((7.25, 26.715994864)):
            Circle(SKETCH_7_R)
        with Locations((7.25, 26.715994864)):
            Circle(SKETCH_7_R_2, mode=Mode.SUBTRACT)
    extrude(amount=-CUT_EXTRUDE_2_DEPTH, mode=Mode.SUBTRACT)

    # 필렛2
    fillet_2_edges = [part.edges().sort_by_distance(p)[0] for p in [
        (32.076213917, 2.167766389, 3),
        (32.421946091, -1.527768478, 3),
        (32.129052872, -5.174147202, 3),
        (28.482674148, -5.467040421, 3),
        (24.78713928, -5.121308248, 3),
        (-32.314407571, 7.976729123, 3),
        (21.421946091, 18.532959579, 3),
        (26.799843583, 0.155062087, 3),
    ]]
    fillet(fillet_2_edges, radius=FILLET_2_R)


solid = part.part
